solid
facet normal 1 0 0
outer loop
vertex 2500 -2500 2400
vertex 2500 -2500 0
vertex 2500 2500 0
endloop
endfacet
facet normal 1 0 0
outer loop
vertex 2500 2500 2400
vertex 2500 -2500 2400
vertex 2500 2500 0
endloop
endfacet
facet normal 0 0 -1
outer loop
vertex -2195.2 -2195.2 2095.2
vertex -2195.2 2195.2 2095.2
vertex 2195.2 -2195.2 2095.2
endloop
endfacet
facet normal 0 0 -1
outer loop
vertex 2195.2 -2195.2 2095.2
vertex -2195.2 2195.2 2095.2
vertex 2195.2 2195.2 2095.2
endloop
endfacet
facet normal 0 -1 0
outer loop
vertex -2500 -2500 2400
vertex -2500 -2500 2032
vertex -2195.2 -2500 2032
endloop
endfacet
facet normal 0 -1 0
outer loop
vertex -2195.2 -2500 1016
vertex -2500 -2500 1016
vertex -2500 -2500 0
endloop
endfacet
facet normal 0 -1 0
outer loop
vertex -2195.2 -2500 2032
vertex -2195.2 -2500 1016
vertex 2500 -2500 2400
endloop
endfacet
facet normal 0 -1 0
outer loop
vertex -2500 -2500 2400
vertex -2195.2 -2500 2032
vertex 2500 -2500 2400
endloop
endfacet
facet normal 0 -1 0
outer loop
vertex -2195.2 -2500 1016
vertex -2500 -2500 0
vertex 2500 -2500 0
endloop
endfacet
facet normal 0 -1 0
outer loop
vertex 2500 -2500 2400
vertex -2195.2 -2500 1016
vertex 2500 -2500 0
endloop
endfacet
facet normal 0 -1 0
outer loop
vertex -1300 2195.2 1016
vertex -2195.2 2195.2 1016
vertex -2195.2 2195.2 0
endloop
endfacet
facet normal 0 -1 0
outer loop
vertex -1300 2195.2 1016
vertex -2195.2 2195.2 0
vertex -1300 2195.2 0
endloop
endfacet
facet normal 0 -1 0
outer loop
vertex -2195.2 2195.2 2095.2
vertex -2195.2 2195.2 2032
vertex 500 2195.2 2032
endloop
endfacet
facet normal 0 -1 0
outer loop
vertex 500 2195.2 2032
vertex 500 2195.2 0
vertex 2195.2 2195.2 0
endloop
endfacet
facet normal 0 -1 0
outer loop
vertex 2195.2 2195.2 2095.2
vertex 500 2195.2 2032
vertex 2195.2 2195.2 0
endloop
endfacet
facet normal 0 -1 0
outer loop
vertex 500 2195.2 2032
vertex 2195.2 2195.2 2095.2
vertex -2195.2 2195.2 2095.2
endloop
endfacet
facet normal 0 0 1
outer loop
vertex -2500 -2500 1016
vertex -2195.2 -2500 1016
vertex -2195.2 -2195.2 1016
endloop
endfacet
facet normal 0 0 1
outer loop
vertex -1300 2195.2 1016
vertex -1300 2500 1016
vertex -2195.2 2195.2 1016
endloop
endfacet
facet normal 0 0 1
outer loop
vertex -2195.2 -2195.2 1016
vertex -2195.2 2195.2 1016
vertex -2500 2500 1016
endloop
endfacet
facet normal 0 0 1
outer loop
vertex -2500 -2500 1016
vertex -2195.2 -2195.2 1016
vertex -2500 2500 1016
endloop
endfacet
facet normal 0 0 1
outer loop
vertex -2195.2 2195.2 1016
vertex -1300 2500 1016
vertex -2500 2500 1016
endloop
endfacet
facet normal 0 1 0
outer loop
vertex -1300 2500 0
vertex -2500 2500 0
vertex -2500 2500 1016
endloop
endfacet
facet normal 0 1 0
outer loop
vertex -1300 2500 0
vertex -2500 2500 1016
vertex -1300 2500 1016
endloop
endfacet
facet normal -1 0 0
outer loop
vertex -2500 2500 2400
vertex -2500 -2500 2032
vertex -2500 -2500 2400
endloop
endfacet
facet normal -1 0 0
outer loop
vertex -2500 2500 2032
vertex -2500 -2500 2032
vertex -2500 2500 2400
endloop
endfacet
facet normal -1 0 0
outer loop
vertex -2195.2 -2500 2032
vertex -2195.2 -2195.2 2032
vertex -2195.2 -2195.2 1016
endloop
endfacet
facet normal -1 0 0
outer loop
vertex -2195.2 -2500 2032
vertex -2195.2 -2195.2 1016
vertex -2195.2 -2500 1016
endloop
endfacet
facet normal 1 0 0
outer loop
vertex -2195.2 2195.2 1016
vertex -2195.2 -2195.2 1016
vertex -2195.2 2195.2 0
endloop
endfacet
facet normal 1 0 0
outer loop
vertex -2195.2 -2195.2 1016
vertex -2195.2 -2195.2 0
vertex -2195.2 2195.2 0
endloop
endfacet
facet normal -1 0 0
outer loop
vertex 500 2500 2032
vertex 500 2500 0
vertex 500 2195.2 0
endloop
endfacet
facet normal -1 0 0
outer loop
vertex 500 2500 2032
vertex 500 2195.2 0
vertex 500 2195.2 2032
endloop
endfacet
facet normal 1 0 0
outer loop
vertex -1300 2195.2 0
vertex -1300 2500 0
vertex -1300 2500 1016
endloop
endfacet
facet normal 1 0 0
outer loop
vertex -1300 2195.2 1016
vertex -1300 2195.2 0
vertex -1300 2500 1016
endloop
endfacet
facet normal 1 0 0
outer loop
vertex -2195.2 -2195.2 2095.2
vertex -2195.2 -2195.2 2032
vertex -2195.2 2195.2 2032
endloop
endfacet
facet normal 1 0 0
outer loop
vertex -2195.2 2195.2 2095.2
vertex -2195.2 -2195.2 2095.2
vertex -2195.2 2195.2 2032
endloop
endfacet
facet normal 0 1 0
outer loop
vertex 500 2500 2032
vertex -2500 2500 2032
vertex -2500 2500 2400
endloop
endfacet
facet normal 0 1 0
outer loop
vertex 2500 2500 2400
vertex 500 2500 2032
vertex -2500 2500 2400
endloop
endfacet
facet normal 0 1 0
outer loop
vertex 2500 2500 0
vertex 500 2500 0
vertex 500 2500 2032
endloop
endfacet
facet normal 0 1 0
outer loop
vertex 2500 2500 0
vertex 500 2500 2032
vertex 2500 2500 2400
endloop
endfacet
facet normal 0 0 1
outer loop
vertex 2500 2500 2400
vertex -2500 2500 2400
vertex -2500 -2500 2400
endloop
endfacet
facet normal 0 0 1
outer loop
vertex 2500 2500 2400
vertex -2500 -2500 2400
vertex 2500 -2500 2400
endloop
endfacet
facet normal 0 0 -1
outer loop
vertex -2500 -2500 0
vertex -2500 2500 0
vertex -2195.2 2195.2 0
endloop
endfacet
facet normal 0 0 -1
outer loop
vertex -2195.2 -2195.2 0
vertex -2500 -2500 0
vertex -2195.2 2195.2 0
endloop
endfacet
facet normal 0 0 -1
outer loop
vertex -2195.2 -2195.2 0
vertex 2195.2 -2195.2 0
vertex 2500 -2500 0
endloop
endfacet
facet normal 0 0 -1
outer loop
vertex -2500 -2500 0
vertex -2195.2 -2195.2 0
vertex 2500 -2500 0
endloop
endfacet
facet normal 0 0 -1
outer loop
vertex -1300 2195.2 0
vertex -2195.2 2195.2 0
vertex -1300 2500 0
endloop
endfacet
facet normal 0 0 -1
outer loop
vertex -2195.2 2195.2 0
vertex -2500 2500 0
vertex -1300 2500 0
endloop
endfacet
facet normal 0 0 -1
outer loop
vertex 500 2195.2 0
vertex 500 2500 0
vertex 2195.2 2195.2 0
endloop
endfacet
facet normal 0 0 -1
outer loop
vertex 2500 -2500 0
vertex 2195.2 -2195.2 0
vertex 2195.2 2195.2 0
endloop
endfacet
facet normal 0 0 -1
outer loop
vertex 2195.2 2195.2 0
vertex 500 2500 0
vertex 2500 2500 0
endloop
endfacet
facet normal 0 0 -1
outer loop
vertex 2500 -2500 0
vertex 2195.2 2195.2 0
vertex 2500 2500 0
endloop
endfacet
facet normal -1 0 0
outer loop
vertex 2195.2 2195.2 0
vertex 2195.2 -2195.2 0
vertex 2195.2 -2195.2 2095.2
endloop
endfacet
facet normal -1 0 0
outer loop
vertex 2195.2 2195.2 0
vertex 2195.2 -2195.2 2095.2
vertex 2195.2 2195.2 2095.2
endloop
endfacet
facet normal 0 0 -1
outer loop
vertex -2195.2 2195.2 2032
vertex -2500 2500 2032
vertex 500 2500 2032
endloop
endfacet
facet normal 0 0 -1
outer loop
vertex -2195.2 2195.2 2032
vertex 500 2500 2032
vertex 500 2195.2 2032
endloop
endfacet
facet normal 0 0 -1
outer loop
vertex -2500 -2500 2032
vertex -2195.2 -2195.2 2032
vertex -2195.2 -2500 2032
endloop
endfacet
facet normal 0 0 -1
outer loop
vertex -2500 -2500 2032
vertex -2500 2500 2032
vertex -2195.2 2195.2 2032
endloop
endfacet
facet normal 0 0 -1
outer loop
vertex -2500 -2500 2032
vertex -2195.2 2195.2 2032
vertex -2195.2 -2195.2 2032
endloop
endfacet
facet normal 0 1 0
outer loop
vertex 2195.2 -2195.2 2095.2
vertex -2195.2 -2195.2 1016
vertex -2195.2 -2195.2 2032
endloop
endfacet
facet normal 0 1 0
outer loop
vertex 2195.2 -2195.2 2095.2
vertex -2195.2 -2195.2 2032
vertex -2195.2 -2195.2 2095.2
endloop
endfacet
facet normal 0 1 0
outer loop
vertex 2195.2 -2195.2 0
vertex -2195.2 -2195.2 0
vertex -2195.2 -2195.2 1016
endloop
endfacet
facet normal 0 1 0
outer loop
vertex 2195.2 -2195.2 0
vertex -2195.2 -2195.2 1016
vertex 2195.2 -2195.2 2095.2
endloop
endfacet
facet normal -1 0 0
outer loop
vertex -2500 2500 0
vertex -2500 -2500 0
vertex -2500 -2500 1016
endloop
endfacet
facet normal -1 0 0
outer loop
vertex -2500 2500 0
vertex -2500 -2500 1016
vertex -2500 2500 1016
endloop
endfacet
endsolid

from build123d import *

# Parameters (mm, degrees)
F0_W      = 5000
F0_H      = 5000
F1_DEPTH  = 2400
F2_T      = -304.8
F3_W      = 1800
F3_H      = 2032
F2_FACE_W = 4390.4
F2_FACE_H = 2095.2
F4_DEPTH  = 457.2
F5_W      = 1200
F5_H      = 1016
F6_DEPTH  = 457.2
F7_W      = 4542.8
F7_H      = 1016
F8_DEPTH  = 304.8


with BuildPart() as f1:
    # F0 (on Top) → F1 (new body)
    with BuildSketch(Plane.XY):
        Rectangle(F0_W, F0_H)
    extrude(amount=F1_DEPTH)

    # F2
    f2_openings = [f1.faces().sort_by_distance(p)[0] for p in [
        (0, 0, 0),
    ]]
    offset(amount=F2_T, openings=f2_openings)

    # F3 (on face) + F2_face (on face) → F4 (cut)
    with BuildSketch(Plane(origin=(0, 2500, 0), x_dir=(-1, 0, 0), z_dir=(0, 1, 0))):
        with Locations((400, 1016)):
            Rectangle(F3_W, F3_H)
    with BuildSketch(Plane(origin=(0, 2195.2, 1047.6), x_dir=(1, 0, 0), z_dir=(0, -1, 0))):
        Rectangle(F2_FACE_W, F2_FACE_H)
    extrude(amount=-F4_DEPTH, dir=(0, 1, 0), mode=Mode.SUBTRACT)

    # F5 (on face) → F6 (cut)
    with BuildSketch(Plane(origin=(0, 2500, 0), x_dir=(-1, 0, 0), z_dir=(0, 1, 0))):
        with Locations((1900, 1524)):
            Rectangle(F5_W, F5_H)
    extrude(amount=-F6_DEPTH, mode=Mode.SUBTRACT)

    # F7 (on face) → F8 (cut)
    with BuildSketch(Plane(origin=(-2500, 0, 0), x_dir=(0, -1, 0), z_dir=(-1, 0, 0))):
        with Locations((228.6, 1524)):
            Rectangle(F7_W, F7_H)
    extrude(amount=-F8_DEPTH, mode=Mode.SUBTRACT)


solid = f1.part
